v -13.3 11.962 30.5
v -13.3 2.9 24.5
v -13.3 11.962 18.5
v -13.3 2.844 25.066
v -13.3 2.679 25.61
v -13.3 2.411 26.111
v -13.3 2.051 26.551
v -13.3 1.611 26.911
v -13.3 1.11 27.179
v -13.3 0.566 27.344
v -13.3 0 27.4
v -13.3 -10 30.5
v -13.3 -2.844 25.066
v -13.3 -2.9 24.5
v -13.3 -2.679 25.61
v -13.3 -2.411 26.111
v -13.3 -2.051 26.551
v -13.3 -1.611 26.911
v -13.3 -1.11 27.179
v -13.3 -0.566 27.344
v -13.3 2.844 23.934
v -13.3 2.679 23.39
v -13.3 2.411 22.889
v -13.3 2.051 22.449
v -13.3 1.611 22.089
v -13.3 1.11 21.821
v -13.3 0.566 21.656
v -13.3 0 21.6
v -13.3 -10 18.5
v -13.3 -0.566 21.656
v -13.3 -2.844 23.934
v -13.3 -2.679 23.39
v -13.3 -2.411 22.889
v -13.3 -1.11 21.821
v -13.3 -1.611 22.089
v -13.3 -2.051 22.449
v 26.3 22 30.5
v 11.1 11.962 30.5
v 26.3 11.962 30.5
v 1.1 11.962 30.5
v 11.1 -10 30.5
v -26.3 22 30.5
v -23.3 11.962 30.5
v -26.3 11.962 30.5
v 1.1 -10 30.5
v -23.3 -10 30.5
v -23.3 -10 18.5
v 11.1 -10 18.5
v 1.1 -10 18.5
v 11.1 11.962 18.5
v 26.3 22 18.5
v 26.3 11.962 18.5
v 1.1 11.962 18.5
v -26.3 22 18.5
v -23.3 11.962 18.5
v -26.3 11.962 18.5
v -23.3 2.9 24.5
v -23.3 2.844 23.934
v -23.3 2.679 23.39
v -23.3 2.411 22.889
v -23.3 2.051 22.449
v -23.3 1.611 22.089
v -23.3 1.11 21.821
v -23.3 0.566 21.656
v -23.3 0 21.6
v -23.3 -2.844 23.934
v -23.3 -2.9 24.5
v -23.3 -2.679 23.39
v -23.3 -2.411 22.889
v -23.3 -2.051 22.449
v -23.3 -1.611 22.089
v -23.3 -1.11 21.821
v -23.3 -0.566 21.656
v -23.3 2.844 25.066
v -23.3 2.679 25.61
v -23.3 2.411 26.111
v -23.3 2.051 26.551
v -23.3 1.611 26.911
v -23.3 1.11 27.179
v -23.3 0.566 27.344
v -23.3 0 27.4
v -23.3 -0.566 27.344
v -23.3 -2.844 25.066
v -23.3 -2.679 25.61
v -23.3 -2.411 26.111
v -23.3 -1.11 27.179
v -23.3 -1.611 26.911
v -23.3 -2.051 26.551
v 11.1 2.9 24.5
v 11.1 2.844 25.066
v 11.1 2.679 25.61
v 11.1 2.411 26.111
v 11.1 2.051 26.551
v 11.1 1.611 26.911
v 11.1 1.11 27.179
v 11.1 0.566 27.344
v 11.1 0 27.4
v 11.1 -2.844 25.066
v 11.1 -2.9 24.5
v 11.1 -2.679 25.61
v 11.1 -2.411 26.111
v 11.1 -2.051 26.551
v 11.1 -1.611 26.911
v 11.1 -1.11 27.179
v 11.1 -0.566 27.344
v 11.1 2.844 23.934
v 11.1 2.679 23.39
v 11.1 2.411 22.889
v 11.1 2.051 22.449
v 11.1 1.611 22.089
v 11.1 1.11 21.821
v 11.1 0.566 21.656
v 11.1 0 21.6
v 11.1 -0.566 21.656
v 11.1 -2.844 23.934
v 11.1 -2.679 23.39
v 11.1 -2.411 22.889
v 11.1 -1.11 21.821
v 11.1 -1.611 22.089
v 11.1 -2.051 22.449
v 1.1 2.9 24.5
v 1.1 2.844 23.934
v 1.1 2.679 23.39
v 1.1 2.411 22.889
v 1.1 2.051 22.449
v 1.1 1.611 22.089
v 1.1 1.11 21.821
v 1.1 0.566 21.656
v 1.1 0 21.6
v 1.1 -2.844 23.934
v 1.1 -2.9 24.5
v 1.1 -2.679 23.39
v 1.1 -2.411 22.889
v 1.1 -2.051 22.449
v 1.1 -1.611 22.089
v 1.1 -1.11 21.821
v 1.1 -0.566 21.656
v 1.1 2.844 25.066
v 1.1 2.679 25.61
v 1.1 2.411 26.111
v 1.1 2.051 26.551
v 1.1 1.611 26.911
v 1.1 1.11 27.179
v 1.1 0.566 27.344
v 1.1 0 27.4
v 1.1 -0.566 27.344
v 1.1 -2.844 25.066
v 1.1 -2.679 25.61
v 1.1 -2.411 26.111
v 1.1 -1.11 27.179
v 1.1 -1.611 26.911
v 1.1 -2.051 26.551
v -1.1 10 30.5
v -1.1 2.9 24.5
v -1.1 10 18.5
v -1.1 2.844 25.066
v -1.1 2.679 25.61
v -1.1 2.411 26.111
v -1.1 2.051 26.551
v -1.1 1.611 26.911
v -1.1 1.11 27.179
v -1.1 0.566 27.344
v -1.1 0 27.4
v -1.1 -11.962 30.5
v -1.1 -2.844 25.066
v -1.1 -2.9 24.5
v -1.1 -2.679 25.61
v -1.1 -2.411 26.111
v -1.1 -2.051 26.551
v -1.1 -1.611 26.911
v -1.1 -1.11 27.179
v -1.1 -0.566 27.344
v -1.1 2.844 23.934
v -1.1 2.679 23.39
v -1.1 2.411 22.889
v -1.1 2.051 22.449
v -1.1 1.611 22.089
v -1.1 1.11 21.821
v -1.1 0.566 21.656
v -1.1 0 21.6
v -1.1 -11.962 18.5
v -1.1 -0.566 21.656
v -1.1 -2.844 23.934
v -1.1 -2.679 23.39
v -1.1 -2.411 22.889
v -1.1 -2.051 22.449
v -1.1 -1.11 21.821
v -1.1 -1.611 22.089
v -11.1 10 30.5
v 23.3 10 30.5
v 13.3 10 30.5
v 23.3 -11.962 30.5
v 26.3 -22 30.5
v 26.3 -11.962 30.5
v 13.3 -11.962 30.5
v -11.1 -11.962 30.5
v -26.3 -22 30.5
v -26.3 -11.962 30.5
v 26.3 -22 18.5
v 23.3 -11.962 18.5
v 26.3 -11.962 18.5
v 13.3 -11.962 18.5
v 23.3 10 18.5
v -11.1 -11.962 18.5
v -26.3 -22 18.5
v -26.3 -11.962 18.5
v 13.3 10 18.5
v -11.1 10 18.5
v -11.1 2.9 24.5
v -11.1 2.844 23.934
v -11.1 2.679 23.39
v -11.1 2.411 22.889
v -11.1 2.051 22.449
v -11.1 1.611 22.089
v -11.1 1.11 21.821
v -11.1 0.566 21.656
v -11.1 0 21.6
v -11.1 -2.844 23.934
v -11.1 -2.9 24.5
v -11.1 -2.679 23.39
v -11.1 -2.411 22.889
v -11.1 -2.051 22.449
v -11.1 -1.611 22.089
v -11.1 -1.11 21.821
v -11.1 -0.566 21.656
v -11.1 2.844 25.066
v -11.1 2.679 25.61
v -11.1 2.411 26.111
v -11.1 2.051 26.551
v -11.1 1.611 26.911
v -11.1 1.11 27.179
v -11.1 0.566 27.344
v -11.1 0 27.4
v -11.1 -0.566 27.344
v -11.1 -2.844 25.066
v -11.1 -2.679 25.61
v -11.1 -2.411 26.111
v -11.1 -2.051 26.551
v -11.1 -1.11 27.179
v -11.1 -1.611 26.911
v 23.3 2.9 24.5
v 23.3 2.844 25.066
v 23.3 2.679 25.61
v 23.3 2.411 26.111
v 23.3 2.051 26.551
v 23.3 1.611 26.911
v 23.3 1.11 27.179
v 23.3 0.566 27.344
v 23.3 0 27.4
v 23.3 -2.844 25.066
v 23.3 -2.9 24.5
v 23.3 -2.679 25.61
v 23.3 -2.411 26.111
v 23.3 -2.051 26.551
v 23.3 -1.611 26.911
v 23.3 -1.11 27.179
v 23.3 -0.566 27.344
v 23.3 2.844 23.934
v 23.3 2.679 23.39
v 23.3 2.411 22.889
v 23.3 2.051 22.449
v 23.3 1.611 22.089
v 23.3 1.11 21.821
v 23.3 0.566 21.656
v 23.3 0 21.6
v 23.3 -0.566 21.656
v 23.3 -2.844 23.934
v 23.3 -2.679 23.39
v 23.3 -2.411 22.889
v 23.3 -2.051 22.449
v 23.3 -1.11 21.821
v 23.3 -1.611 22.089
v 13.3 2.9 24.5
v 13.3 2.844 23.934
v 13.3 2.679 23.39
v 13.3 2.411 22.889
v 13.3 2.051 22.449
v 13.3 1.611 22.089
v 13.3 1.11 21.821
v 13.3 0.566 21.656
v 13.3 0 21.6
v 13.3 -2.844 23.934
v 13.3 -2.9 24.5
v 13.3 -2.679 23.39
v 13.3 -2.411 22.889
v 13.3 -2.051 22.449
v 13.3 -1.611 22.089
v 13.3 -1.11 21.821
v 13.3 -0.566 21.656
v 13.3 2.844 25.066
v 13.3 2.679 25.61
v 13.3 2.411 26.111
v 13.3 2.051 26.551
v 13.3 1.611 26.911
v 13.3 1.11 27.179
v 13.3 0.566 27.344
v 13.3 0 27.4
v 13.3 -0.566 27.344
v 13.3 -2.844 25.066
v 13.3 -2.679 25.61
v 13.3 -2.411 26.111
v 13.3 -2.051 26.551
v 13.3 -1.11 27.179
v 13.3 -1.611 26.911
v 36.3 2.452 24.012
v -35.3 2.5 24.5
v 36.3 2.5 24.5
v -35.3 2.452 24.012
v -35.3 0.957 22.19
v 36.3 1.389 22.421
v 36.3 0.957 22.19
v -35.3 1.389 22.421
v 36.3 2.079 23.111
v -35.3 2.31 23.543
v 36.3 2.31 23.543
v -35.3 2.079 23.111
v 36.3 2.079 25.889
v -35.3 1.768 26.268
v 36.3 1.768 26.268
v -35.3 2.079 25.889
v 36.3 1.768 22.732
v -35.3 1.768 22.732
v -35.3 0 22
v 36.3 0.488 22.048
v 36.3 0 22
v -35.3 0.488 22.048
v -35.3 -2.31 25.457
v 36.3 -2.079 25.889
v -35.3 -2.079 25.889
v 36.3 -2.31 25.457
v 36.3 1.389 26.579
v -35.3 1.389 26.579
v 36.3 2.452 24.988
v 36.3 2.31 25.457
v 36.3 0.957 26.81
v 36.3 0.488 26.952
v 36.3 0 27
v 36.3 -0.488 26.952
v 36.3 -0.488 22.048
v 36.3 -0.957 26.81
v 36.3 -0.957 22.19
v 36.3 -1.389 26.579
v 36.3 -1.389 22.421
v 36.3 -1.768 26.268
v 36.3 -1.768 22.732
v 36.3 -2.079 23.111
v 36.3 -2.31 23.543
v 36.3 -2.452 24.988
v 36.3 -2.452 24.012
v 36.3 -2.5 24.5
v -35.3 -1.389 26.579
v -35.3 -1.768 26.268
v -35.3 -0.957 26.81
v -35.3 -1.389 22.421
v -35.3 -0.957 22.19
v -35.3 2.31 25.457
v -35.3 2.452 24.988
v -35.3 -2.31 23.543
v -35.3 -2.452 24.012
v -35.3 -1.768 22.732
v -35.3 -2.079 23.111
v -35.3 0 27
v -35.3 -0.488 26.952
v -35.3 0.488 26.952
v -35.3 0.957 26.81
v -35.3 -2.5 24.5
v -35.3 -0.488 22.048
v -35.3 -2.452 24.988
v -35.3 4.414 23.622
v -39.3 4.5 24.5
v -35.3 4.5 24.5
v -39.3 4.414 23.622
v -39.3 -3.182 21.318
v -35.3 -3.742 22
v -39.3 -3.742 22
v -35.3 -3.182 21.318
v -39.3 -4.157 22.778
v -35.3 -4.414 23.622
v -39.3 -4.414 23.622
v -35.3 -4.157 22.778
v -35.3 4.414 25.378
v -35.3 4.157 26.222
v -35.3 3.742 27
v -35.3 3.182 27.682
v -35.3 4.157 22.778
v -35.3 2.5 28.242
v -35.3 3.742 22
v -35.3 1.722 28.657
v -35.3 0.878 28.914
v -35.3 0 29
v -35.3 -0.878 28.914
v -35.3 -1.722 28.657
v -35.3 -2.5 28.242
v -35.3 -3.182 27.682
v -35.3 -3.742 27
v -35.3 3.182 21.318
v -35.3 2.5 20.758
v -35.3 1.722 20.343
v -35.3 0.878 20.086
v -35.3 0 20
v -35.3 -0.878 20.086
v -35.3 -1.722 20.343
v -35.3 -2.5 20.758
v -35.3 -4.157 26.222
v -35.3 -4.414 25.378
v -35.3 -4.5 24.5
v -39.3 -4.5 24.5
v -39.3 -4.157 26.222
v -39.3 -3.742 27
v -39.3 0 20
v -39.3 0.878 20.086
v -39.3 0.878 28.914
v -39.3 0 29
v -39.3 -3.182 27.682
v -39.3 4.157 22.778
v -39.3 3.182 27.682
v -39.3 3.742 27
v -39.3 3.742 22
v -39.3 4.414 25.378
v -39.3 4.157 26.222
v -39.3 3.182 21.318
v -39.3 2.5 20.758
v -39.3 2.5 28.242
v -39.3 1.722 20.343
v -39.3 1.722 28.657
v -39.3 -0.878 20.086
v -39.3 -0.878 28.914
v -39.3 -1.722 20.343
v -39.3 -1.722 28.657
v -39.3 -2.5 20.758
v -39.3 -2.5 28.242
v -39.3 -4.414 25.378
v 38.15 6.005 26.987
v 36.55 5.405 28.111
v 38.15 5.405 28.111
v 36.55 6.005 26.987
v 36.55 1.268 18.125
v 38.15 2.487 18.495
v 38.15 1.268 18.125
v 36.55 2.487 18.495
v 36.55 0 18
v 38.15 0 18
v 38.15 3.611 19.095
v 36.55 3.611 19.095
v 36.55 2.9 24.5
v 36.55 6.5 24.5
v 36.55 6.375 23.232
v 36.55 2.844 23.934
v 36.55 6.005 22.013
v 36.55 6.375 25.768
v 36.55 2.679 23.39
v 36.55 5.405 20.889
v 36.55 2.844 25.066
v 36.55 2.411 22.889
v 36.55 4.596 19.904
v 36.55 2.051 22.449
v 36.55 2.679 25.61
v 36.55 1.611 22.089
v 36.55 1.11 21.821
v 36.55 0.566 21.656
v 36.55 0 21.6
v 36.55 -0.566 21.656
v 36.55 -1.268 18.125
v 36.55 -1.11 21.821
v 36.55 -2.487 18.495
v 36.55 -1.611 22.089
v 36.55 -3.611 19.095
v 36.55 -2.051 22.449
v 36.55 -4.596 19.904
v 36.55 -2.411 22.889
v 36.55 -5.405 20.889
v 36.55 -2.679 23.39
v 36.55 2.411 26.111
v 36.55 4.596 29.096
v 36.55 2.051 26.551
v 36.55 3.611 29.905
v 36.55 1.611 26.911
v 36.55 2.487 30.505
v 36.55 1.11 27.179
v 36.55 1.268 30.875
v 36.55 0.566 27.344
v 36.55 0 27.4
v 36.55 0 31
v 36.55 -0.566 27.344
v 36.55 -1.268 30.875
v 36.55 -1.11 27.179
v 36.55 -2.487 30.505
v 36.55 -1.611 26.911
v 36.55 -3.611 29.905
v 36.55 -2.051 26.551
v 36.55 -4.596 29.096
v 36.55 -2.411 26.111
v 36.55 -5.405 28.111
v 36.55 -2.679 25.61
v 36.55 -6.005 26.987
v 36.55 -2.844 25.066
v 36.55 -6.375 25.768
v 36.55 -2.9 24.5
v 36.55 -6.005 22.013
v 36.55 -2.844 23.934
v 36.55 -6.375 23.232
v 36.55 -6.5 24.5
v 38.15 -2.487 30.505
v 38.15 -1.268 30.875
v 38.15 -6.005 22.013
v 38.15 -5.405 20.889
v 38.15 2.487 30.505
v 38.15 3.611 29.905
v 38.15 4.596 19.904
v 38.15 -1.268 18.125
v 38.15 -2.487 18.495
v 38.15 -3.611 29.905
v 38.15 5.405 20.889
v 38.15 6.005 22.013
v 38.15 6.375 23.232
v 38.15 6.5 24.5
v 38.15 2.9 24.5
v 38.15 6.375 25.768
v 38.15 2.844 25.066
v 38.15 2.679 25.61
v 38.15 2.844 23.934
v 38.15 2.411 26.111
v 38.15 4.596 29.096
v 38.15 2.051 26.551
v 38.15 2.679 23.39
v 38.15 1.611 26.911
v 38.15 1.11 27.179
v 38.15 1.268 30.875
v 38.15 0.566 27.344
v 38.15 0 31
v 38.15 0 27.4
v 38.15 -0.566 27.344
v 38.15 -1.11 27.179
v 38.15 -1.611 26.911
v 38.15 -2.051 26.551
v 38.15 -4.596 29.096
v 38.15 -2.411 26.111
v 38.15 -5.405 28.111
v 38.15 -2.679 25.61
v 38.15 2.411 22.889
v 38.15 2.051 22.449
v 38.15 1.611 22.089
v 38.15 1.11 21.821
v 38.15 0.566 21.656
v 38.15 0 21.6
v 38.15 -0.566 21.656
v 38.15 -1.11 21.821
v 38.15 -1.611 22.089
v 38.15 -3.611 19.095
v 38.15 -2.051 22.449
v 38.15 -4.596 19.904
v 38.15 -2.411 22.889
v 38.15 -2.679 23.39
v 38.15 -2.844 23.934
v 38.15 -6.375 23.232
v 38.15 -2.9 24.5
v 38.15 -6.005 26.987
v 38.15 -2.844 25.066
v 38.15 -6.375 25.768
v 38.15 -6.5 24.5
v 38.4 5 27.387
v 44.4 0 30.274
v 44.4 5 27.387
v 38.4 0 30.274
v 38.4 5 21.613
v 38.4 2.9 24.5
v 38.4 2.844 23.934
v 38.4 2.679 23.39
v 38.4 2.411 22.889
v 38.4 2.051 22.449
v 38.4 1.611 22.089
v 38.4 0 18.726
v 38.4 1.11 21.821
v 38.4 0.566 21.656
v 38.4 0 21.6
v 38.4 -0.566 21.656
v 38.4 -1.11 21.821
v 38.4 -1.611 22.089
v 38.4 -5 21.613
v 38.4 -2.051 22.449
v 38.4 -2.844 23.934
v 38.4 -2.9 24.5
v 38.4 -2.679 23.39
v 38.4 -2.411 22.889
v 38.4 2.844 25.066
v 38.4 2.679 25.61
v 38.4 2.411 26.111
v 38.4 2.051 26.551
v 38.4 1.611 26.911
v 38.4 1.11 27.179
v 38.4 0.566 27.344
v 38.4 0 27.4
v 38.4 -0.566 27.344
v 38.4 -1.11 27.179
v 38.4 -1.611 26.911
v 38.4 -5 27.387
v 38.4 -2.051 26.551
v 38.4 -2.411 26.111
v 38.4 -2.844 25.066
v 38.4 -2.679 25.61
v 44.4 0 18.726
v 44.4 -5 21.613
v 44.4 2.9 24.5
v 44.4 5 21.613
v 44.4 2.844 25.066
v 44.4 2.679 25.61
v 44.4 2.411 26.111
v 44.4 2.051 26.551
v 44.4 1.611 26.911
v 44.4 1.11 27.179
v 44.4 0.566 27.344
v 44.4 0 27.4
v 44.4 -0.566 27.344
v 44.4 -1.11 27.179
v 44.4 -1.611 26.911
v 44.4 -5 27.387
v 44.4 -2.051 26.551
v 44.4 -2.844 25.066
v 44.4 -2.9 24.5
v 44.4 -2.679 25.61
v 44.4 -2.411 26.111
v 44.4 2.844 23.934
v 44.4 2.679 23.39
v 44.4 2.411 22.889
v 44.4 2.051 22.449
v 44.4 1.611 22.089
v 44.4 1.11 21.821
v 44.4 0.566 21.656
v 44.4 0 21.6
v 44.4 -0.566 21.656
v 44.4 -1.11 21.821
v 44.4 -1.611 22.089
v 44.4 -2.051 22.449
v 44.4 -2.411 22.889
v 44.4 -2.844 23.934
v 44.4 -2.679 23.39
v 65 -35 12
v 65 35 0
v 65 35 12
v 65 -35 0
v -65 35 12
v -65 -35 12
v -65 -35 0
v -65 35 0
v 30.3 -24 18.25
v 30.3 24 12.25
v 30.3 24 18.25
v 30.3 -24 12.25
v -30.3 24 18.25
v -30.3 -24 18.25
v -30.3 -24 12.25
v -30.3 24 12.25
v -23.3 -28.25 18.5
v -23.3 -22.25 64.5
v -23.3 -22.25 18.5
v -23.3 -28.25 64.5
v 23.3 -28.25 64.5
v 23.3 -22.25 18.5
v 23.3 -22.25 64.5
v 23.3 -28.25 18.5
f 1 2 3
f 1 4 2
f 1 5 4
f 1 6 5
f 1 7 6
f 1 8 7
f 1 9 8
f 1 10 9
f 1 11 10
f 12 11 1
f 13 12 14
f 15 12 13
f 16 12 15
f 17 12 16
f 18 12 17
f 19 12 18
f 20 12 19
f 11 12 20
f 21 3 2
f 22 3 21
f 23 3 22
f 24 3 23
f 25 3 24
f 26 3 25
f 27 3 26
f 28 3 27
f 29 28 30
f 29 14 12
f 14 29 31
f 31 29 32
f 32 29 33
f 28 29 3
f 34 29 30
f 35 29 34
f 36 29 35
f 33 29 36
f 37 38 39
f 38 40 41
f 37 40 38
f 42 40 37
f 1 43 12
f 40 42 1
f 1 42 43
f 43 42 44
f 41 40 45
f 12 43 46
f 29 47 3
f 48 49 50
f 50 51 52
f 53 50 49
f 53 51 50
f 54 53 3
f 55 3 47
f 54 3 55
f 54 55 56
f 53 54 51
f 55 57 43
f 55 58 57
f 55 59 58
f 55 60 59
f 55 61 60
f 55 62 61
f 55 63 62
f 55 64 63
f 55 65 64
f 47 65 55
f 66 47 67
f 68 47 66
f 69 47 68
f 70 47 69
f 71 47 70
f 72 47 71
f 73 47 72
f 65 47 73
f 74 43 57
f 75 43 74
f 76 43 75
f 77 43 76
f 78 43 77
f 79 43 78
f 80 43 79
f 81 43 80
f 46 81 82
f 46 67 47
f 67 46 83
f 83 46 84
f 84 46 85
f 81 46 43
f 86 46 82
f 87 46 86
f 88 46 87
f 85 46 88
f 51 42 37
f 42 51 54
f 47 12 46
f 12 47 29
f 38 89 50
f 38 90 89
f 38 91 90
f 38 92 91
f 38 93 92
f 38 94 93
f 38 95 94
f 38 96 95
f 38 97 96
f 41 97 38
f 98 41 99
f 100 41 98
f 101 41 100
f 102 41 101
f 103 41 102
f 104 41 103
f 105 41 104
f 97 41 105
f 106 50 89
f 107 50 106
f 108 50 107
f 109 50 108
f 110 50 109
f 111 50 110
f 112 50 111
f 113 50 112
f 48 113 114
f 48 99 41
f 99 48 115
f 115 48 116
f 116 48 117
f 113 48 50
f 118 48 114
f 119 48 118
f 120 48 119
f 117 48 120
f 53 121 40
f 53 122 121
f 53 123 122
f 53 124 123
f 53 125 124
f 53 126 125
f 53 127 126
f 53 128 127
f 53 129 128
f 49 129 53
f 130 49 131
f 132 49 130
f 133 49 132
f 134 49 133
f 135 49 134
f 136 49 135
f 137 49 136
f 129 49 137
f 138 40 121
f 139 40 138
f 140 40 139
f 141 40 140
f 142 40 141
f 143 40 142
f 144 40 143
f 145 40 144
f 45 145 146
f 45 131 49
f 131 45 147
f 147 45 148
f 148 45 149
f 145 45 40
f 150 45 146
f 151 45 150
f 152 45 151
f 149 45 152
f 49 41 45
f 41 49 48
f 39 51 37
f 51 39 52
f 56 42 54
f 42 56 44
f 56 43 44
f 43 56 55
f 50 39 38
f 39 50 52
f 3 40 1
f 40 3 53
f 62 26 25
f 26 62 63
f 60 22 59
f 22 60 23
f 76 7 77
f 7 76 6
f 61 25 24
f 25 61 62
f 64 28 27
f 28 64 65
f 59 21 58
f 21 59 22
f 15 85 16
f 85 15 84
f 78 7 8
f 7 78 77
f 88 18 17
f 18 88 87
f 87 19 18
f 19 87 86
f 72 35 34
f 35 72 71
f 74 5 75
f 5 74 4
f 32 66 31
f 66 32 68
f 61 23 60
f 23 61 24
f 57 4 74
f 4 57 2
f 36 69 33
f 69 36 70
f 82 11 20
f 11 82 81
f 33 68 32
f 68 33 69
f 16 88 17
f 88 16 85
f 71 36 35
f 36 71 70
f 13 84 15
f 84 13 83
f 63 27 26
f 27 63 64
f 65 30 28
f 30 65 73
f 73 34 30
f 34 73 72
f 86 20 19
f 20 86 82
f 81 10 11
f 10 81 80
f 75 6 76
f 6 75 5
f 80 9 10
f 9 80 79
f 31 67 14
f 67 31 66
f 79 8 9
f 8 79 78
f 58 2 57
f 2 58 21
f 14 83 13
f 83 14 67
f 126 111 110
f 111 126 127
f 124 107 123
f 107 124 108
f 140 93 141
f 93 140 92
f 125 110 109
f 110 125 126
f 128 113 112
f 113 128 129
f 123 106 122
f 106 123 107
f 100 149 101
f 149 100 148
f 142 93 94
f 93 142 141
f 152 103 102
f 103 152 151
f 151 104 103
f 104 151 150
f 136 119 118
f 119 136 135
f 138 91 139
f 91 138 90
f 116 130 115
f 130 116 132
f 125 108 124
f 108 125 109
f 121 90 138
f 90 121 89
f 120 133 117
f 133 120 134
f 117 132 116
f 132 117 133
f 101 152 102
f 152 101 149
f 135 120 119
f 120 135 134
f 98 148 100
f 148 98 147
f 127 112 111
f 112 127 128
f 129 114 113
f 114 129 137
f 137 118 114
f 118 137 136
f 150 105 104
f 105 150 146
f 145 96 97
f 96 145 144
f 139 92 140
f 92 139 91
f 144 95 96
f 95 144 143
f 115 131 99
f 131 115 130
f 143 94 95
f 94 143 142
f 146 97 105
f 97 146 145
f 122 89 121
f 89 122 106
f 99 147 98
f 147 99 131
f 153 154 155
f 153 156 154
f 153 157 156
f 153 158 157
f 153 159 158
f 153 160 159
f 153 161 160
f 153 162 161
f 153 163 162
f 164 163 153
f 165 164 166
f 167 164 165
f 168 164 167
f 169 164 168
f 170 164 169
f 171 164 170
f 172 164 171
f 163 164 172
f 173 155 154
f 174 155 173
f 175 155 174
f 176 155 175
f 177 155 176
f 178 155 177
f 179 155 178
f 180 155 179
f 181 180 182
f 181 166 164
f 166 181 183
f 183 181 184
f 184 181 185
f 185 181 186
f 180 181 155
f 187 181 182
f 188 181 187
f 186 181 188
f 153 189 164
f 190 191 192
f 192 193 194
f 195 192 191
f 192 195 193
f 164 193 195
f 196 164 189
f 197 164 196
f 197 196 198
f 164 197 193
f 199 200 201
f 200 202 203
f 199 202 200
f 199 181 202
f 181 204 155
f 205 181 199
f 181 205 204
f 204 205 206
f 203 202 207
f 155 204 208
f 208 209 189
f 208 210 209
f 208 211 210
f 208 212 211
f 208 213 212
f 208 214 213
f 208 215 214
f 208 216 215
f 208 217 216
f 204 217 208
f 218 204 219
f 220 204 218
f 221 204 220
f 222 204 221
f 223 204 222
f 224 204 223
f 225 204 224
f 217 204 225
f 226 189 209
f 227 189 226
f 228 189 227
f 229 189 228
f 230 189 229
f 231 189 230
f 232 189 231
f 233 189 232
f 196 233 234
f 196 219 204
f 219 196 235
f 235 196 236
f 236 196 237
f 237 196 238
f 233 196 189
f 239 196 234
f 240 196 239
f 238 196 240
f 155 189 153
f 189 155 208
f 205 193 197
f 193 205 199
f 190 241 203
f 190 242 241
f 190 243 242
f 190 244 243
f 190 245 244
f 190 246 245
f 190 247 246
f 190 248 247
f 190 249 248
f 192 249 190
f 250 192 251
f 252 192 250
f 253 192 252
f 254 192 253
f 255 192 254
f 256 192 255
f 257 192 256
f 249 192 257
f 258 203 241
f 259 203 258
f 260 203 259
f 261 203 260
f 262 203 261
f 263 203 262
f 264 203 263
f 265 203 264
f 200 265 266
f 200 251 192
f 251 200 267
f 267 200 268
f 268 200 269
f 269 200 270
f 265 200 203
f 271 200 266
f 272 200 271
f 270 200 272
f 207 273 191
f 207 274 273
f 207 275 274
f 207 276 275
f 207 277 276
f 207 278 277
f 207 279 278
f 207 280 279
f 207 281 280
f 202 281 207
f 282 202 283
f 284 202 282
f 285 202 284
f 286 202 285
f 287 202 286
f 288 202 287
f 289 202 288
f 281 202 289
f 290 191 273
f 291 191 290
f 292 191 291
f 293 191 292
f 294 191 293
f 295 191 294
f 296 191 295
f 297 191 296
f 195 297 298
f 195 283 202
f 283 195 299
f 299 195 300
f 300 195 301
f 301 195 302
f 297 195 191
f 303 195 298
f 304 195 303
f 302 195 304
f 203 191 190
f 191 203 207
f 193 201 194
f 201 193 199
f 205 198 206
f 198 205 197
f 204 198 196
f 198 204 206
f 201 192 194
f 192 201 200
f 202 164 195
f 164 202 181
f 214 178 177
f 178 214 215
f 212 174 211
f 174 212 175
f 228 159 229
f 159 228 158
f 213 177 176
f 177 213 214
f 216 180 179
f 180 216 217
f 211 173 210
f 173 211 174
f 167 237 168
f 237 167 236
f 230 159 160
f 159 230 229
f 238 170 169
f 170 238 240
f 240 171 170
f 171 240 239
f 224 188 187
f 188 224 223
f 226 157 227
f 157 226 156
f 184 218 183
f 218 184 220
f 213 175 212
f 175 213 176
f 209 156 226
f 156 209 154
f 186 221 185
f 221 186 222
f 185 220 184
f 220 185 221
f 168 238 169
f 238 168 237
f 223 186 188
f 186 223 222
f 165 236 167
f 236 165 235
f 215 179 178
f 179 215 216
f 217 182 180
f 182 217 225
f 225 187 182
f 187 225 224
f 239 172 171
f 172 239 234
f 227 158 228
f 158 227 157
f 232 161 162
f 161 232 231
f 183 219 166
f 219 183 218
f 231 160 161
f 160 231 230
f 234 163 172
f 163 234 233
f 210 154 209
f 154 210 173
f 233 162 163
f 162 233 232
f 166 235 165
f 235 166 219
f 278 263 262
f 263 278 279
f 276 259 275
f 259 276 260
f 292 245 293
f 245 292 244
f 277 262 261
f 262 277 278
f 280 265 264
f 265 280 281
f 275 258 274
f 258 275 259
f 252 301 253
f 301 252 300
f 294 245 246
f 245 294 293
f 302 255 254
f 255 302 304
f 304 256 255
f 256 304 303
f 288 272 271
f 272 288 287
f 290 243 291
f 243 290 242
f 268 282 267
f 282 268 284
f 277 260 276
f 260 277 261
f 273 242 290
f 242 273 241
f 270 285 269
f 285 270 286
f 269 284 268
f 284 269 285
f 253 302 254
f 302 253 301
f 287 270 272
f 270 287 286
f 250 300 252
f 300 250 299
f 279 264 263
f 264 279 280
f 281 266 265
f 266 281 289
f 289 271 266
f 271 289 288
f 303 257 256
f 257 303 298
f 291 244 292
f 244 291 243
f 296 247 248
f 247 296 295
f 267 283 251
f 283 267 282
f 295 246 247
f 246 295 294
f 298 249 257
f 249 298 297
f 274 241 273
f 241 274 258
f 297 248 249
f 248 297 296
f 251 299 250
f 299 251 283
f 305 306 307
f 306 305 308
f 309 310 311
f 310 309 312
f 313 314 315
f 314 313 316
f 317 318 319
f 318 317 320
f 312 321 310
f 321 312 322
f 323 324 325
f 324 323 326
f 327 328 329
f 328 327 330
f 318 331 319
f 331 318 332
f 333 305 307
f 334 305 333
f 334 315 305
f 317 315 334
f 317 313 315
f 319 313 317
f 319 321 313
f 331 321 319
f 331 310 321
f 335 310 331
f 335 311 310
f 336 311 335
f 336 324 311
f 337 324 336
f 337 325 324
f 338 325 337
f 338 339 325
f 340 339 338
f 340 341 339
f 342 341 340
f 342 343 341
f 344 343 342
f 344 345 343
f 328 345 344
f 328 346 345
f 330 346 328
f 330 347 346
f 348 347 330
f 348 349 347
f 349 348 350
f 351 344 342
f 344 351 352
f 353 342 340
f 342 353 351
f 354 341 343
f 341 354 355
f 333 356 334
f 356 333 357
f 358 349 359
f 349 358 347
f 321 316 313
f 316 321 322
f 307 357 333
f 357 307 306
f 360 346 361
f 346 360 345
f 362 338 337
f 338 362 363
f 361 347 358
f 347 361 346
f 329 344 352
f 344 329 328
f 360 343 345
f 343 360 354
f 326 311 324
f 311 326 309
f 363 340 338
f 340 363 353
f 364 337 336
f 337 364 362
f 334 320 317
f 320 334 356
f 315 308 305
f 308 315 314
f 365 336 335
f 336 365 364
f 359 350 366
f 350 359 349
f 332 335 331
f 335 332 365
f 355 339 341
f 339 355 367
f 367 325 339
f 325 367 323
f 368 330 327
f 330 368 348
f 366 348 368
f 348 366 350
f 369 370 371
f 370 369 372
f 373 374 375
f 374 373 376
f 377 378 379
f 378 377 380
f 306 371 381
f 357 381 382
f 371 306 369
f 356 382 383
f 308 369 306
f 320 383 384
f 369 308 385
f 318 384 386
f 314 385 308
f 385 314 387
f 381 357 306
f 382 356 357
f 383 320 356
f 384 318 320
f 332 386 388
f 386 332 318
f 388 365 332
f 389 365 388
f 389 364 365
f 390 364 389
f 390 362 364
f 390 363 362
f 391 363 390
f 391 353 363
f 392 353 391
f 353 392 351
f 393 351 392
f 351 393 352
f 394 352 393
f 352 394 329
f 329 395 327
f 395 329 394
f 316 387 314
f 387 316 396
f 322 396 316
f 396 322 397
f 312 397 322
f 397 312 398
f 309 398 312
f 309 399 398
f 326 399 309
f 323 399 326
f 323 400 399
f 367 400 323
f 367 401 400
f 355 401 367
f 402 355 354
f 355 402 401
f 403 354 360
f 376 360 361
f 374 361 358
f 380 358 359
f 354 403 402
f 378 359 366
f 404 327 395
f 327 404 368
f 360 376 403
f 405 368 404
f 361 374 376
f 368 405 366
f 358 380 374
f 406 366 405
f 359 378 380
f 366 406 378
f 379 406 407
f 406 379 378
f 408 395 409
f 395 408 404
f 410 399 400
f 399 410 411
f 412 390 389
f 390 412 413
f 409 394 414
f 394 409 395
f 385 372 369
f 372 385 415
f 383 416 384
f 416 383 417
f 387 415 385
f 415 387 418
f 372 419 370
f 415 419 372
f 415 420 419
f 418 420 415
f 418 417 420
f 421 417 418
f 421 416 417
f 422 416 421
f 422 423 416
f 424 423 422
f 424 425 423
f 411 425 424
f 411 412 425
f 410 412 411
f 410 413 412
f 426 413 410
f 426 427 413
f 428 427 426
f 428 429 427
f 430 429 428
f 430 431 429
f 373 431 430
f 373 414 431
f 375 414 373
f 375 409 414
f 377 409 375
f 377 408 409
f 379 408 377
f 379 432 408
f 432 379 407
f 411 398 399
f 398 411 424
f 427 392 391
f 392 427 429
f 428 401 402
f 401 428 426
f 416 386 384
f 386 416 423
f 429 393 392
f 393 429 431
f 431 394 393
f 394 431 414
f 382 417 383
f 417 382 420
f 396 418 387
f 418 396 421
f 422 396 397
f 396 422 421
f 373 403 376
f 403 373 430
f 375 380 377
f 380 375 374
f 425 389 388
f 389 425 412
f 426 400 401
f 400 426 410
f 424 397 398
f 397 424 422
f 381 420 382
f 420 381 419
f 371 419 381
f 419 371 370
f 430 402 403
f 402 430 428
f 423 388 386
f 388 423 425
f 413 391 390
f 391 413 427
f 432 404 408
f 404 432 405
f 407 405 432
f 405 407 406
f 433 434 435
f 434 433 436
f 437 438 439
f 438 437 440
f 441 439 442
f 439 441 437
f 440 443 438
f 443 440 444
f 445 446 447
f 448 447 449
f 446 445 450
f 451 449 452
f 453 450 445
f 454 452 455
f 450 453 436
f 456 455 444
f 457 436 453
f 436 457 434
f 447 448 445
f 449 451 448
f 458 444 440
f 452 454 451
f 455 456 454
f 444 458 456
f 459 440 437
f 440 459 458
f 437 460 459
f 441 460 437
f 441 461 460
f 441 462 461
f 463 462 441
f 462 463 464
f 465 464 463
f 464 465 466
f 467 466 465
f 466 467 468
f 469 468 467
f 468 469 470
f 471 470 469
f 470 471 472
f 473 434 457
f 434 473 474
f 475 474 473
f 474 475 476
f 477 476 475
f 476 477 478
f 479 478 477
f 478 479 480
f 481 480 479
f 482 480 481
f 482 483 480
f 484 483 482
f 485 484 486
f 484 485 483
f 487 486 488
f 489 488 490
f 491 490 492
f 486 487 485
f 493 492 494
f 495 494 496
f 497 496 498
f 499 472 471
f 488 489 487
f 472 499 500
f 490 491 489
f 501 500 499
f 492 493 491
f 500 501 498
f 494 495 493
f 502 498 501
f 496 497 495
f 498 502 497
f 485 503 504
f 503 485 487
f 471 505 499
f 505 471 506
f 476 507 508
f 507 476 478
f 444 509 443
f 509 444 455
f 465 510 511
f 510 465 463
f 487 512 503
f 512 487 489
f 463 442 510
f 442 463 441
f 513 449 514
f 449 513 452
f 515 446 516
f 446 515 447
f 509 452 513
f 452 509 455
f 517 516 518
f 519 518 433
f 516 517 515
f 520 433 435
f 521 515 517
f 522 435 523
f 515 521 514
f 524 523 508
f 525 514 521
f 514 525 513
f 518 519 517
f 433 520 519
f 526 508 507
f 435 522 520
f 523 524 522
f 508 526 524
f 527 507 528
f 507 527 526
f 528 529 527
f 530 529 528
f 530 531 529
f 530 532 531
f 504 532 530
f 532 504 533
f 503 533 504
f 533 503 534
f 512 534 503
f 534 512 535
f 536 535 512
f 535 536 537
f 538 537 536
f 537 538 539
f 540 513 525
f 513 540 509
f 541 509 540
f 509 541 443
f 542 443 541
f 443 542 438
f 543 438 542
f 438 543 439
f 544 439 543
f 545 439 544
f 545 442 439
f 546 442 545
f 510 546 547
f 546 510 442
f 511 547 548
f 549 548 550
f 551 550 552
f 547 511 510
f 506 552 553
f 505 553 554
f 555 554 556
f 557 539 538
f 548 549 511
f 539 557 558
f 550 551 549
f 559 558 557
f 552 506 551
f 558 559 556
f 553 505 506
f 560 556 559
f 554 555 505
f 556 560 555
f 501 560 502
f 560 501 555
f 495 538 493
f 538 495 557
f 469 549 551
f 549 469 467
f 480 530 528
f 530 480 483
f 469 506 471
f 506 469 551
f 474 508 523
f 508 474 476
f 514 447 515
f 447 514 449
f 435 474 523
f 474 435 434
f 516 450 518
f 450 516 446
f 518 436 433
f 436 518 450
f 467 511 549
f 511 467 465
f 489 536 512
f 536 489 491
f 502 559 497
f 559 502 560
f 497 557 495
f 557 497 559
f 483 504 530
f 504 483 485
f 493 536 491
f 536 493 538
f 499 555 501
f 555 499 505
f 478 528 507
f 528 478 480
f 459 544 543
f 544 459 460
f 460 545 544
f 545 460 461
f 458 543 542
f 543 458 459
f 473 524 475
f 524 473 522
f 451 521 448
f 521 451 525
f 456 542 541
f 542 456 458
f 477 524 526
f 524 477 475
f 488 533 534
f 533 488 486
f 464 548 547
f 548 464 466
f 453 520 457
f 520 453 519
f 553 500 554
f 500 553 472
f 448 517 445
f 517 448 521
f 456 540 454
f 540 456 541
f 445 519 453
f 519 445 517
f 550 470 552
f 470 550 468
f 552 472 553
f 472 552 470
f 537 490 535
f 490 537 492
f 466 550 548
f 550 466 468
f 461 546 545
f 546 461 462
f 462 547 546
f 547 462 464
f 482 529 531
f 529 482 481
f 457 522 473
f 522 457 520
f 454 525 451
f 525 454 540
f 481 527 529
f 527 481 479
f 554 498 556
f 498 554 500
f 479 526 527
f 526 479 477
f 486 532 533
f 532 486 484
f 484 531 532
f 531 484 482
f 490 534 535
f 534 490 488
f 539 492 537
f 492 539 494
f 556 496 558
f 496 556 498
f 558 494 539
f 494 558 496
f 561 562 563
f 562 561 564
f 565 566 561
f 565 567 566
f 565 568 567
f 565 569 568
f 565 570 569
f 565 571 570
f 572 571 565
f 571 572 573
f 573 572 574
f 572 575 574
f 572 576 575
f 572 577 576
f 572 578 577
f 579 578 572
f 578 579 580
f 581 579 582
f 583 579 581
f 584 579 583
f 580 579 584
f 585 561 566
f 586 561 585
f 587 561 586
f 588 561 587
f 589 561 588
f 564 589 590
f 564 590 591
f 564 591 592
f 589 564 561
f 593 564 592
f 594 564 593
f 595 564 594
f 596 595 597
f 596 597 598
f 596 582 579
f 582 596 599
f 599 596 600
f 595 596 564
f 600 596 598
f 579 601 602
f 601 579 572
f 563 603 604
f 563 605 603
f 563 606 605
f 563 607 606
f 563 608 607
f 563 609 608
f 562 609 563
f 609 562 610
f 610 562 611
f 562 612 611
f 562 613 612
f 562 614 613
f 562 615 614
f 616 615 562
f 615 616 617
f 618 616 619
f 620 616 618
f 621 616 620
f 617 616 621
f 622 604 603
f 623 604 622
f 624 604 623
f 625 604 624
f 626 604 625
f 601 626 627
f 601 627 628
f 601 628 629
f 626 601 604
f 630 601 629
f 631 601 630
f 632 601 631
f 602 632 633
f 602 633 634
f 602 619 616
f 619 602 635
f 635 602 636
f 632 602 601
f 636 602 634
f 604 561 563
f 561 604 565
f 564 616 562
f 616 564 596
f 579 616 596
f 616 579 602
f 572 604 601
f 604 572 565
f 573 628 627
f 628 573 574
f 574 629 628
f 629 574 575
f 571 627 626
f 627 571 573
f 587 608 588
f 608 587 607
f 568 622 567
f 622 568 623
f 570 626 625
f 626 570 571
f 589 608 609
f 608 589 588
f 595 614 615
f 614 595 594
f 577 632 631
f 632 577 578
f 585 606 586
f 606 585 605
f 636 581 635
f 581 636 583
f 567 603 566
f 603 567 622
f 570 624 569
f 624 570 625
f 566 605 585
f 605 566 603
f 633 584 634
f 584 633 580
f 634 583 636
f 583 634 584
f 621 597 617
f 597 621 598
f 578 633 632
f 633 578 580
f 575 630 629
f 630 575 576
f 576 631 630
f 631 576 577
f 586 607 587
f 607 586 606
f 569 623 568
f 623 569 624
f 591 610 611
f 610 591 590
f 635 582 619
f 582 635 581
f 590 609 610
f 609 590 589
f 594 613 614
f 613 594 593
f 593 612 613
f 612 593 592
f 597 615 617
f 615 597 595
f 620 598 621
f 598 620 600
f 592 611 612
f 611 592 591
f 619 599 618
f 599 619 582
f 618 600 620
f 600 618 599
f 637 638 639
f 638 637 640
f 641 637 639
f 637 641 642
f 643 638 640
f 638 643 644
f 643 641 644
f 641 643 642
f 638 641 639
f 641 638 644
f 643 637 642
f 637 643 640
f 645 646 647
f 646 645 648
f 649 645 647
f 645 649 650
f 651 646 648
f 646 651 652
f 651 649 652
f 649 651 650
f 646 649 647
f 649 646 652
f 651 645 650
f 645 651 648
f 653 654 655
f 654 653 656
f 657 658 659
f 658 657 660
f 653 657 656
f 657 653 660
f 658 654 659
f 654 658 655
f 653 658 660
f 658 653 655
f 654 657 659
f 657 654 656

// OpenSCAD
$fn = 32;

// ------------------------------------------------------------------------
// Comb hinge with flap: leaf 52.6 x 22 mm, pin d5, flap 46 mm
// Every part is its own module, assembly() places every instance.
// ------------------------------------------------------------------------

// --- part 1 ---
module hinge_bed() {
  difference() {
    translate([-65, -35, 0]) cube([130, 70, 12]);
  }
}

// --- part 2 ---
module hinge_riser() {
  difference() {
    translate([-30.3, -24, 0]) cube([60.6, 48, 6]);
  }
}

// --- part 3 ---
module hinge_leaf_a() {
  difference() {
    union() {
      translate([-23.3, -10, -6]) cube([10, 32, 12]);
      translate([1.1, -10, -6]) cube([10, 32, 12]);
      translate([-26.3, 11.962, -6]) cube([52.6, 10.038, 12]);
    }
    translate([-18.3, 0, 0]) rotate([0, 90, 0]) cylinder(h = 12, d = 5.8, center = true);
    translate([6.1, 0, 0]) rotate([0, 90, 0]) cylinder(h = 12, d = 5.8, center = true);
  }
}

// --- part 4 ---
module hinge_leaf_b() {
  difference() {
    union() {
      translate([-11.1, -22, -6]) cube([10, 32, 12]);
      translate([13.3, -22, -6]) cube([10, 32, 12]);
      translate([-26.3, -22, -6]) cube([52.6, 10.038, 12]);
    }
    translate([-6.1, 0, 0]) rotate([0, 90, 0]) cylinder(h = 12, d = 5.8, center = true);
    translate([18.3, 0, 0]) rotate([0, 90, 0]) cylinder(h = 12, d = 5.8, center = true);
  }
}

// --- part 5 ---
module hinge_flap() {
  difference() {
    translate([-23.3, -23, 0]) cube([46.6, 46, 6]);
  }
}

// --- part 6 ---
module hinge_pin() {
  rotate([0, 90, 0]) cylinder(h = 72.6, d = 5, center = true);
  translate([-39.3, 0, 0]) rotate([0, 90, 0]) cylinder(h = 4, d = 9);
}

// --- part 7 ---
module pin_washer() {
  difference() {
      translate([0, 0, 0]) cylinder(h = 1.6, d = 13);
      translate([0, 0, -1]) cylinder(h = 3.6, d = 5.8);
    }
}

// --- part 8 ---
module pin_nut() {
  difference() {
    linear_extrude(height = 6) polygon(points = [[5.774, 0], [2.887, 5], [-2.887, 5], [-5.774, 0], [-2.887, -5], [2.887, -5]]);
    translate([0, 0, -1]) cylinder(h = 8, d = 5.8);
  }
}

// --- assembly ---
module assembly() {
  color([0.80, 0.24, 0.20]) translate([0, 0, 0]) rotate([0, 0, 0]) hinge_bed();
  color([0.20, 0.45, 0.75]) translate([0, 0, 12.25]) rotate([0, 0, 0]) hinge_riser();
  color([0.25, 0.62, 0.32]) translate([0, 0, 24.5]) rotate([0, 0, 0]) hinge_leaf_a();
  color([0.92, 0.70, 0.18]) translate([0, 0, 24.5]) rotate([0, 0, 0]) hinge_leaf_b();
  color([0.58, 0.35, 0.70]) translate([0, -22.25, 41.5]) rotate([90, 0, 0]) hinge_flap();
  color([0.16, 0.66, 0.66]) translate([0, 0, 24.5]) rotate([0, 0, 0]) hinge_pin();
  color([0.85, 0.48, 0.18]) translate([36.55, 0, 24.5]) rotate([0, 90, 0]) pin_washer();
  color([0.55, 0.60, 0.65]) translate([38.4, 0, 24.5]) rotate([0, 90, 0]) pin_nut();
}

assembly();
